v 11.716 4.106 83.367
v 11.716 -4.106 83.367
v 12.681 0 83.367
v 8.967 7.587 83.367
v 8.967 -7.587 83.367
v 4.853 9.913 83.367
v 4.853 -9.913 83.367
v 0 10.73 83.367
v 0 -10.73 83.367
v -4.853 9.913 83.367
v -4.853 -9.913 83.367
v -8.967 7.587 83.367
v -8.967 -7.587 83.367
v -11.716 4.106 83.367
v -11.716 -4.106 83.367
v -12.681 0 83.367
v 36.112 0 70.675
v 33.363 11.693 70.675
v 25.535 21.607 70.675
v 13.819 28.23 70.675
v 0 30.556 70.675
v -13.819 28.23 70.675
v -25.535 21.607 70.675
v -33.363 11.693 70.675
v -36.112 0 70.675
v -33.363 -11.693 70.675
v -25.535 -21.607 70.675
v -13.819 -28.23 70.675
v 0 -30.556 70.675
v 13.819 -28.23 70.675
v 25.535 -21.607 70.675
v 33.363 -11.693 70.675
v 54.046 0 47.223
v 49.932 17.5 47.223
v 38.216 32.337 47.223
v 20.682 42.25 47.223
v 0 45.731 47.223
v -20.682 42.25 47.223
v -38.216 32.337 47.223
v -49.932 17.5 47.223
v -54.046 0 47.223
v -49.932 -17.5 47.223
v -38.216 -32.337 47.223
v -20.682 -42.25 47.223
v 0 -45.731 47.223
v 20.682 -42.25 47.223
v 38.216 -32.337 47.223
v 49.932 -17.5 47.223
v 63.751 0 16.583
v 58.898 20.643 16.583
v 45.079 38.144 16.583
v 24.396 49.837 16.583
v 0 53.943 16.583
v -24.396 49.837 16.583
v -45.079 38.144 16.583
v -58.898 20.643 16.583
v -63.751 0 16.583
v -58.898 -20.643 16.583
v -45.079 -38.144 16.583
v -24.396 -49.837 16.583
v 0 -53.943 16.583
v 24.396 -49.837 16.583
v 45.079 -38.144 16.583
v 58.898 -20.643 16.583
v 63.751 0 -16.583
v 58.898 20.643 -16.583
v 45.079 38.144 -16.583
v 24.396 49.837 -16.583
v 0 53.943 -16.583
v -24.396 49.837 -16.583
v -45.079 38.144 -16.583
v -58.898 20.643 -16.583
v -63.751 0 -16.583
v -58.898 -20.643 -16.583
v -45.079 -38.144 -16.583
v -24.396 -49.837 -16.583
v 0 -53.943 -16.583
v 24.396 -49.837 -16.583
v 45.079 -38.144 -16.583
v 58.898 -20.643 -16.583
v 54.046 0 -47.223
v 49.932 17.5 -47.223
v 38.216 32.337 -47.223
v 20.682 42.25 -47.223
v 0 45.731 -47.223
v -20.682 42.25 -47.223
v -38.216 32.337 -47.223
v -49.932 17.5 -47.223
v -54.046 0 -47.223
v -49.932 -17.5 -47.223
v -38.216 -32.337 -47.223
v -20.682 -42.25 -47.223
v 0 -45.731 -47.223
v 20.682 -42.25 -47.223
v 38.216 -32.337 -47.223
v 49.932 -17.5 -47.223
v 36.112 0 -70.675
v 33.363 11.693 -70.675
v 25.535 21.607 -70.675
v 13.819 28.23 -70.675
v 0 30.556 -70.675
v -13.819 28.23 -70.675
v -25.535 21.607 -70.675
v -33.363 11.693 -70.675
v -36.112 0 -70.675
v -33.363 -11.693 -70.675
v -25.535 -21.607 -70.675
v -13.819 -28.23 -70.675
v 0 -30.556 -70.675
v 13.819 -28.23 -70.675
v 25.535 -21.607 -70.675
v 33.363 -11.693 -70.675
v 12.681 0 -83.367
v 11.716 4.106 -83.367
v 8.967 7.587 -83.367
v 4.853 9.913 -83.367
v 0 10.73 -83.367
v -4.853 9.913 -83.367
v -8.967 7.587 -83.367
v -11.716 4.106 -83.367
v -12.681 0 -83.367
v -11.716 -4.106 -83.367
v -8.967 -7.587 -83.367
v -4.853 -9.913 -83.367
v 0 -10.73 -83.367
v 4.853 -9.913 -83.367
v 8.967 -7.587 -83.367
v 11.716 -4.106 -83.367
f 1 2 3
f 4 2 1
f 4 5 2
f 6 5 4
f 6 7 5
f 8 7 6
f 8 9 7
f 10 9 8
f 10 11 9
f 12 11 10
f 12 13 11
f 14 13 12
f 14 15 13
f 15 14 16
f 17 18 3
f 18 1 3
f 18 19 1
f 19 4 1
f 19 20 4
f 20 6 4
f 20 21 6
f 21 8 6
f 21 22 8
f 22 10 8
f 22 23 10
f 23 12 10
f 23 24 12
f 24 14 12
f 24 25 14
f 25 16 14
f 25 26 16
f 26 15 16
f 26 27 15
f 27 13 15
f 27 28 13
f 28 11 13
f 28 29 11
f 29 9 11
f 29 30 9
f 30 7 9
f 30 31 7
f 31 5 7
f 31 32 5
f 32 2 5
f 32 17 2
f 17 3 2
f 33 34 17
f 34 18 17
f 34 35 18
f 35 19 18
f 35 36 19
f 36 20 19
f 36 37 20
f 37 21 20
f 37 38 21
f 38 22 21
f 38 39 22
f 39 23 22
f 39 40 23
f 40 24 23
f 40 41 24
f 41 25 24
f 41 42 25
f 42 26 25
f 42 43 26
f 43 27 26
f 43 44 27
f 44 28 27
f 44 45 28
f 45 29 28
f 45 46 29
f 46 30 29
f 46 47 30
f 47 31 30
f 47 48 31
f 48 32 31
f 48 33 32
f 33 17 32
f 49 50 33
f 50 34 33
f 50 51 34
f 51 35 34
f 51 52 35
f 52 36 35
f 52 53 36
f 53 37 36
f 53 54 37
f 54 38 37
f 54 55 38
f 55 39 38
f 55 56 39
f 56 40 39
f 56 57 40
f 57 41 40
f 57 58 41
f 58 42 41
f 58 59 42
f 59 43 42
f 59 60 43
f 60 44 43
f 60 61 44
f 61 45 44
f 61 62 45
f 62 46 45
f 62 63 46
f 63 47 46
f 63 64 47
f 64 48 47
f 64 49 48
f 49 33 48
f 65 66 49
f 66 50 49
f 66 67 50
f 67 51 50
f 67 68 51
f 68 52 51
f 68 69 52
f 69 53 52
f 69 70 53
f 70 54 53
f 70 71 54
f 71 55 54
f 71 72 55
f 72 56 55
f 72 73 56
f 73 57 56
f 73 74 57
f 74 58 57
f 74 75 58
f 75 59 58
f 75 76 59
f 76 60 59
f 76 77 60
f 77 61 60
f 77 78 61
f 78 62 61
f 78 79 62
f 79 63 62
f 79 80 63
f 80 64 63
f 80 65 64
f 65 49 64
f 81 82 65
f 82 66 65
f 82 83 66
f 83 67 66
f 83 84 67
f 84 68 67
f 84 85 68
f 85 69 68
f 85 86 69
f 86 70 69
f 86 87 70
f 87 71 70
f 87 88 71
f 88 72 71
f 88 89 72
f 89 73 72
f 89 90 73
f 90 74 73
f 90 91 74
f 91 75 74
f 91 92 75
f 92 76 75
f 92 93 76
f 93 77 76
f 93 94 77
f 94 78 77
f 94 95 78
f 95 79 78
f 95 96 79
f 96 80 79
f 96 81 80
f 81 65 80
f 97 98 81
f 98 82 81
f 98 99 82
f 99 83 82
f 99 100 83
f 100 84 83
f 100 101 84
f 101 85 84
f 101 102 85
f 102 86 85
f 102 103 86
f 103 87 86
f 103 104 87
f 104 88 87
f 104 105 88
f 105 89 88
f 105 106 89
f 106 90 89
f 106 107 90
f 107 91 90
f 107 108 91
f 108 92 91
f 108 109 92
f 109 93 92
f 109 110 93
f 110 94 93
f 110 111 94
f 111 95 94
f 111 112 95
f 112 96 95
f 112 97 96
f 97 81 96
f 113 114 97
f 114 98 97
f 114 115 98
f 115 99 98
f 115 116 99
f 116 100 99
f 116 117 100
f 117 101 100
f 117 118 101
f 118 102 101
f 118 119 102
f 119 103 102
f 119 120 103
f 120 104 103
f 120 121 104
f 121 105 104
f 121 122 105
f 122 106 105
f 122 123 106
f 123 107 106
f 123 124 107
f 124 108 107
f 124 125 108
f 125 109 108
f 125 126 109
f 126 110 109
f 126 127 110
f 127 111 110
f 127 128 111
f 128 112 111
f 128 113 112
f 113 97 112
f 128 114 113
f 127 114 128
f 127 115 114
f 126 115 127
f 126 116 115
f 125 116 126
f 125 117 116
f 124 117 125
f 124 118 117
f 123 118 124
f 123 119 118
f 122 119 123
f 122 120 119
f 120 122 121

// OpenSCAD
// Generated by SolidPython 1.0.1 on 2020-07-29 00:46:51


scale(v = [13, 11, 17]) {
	sphere(r = 5);
}
/***********************************************
*********      SolidPython code:      **********
************************************************
 
# import packages: SolidPython
from solid import *
from solid.utils import *
from itertools import chain, combinations, permutations


class Resize:

    def __init__(self, scad_file):
        self.scad_file = scad_file
        #self.scad_file = import_scad(scad_file)
        # cone/cylinder param:
        self.r1 = 0
        self.r2 = 0
        self.h = 0
        # rectangular prism param:
        self.w = 0
        self.l = 0
        # ellipse param:
        self.r = 0

    # import OpenScad code (file name corresponds to shape)


    # classify shape + parameters
    def assign(self, param1, param2, param3):
        if self.scad_file == 'cone.scad':
            self.r1 = param1
            self.r2 = param2
            self.h = param3
        elif self.scad_file == 'cylinder.scad':
            self.r1 = param1
            self.r2 = param2
            self.h = param3
        elif self.scad_file == 'rectangularPrism.scad':
            self.h = param1
            self.l = param2
            self.w = param3
        else:
            self.r = param1
            self.h = param2

    # resize parameters
    def iterate(self):
        x = range(3, 20, 2)
        i = 1
        if self.scad_file == 'cone.scad':
            tempList = list(permutations(x, 2))
            for temp in tempList:
                param1 = temp[0]
                param2 = temp[1]
                filepath = 'produced_scad_files/' + 'cone' + str(param1) + '_' + str(param2) + '_' + '.scad'
                scad_render_to_file(cylinder(h=param1, r1=param2, r2=0), filepath)

        elif self.scad_file == 'cylinder.scad':
            tempList = list(permutations(x, 3))
            for temp in tempList:
                param1 = temp[0]
                param2 = temp[1]
                filepath = 'produced_scad_files/' + 'cylinder' + str(param1) + '_' + str(param2) + '_' + '.scad'
                scad_render_to_file(cylinder(h=param1, r1=param2, r2=param2), filepath)

        elif self.scad_file == 'rectangularPrism.scad':
            tempList = list(permutations(x, 3))
            for temp in tempList:
                param1 = temp[0]
                param2 = temp[1]
                param3 = temp[2]
                filepath = 'produced_scad_files/' + 'rectangularPrism' + str(param1) + '_' + str(param2) + '_' + str(
                    param3) + '.scad'
                scad_render_to_file(cube(size=(param1, param2, param3)), filepath)

        elif self.scad_file == 'ellipse.scad':
            tempList = list(permutations(x, 4))
            for temp in tempList:
                param1 = temp[0]
                param2 = temp[1]
                param3 = temp[2]
                param4 = temp[3]
                filepath = 'produced_scad_files/' + 'ellipse' + str(param1) + '_' + str(param2) + '_' + str(param3) + '_' + str(param4) + '.scad'
                scad_render_to_file(scale([param1, param2, param3])(sphere(r=param4)), filepath)

    def render_to_scadfile(self):
        scad_render_to_file(scad, 'example.scad') 
 
************************************************/
